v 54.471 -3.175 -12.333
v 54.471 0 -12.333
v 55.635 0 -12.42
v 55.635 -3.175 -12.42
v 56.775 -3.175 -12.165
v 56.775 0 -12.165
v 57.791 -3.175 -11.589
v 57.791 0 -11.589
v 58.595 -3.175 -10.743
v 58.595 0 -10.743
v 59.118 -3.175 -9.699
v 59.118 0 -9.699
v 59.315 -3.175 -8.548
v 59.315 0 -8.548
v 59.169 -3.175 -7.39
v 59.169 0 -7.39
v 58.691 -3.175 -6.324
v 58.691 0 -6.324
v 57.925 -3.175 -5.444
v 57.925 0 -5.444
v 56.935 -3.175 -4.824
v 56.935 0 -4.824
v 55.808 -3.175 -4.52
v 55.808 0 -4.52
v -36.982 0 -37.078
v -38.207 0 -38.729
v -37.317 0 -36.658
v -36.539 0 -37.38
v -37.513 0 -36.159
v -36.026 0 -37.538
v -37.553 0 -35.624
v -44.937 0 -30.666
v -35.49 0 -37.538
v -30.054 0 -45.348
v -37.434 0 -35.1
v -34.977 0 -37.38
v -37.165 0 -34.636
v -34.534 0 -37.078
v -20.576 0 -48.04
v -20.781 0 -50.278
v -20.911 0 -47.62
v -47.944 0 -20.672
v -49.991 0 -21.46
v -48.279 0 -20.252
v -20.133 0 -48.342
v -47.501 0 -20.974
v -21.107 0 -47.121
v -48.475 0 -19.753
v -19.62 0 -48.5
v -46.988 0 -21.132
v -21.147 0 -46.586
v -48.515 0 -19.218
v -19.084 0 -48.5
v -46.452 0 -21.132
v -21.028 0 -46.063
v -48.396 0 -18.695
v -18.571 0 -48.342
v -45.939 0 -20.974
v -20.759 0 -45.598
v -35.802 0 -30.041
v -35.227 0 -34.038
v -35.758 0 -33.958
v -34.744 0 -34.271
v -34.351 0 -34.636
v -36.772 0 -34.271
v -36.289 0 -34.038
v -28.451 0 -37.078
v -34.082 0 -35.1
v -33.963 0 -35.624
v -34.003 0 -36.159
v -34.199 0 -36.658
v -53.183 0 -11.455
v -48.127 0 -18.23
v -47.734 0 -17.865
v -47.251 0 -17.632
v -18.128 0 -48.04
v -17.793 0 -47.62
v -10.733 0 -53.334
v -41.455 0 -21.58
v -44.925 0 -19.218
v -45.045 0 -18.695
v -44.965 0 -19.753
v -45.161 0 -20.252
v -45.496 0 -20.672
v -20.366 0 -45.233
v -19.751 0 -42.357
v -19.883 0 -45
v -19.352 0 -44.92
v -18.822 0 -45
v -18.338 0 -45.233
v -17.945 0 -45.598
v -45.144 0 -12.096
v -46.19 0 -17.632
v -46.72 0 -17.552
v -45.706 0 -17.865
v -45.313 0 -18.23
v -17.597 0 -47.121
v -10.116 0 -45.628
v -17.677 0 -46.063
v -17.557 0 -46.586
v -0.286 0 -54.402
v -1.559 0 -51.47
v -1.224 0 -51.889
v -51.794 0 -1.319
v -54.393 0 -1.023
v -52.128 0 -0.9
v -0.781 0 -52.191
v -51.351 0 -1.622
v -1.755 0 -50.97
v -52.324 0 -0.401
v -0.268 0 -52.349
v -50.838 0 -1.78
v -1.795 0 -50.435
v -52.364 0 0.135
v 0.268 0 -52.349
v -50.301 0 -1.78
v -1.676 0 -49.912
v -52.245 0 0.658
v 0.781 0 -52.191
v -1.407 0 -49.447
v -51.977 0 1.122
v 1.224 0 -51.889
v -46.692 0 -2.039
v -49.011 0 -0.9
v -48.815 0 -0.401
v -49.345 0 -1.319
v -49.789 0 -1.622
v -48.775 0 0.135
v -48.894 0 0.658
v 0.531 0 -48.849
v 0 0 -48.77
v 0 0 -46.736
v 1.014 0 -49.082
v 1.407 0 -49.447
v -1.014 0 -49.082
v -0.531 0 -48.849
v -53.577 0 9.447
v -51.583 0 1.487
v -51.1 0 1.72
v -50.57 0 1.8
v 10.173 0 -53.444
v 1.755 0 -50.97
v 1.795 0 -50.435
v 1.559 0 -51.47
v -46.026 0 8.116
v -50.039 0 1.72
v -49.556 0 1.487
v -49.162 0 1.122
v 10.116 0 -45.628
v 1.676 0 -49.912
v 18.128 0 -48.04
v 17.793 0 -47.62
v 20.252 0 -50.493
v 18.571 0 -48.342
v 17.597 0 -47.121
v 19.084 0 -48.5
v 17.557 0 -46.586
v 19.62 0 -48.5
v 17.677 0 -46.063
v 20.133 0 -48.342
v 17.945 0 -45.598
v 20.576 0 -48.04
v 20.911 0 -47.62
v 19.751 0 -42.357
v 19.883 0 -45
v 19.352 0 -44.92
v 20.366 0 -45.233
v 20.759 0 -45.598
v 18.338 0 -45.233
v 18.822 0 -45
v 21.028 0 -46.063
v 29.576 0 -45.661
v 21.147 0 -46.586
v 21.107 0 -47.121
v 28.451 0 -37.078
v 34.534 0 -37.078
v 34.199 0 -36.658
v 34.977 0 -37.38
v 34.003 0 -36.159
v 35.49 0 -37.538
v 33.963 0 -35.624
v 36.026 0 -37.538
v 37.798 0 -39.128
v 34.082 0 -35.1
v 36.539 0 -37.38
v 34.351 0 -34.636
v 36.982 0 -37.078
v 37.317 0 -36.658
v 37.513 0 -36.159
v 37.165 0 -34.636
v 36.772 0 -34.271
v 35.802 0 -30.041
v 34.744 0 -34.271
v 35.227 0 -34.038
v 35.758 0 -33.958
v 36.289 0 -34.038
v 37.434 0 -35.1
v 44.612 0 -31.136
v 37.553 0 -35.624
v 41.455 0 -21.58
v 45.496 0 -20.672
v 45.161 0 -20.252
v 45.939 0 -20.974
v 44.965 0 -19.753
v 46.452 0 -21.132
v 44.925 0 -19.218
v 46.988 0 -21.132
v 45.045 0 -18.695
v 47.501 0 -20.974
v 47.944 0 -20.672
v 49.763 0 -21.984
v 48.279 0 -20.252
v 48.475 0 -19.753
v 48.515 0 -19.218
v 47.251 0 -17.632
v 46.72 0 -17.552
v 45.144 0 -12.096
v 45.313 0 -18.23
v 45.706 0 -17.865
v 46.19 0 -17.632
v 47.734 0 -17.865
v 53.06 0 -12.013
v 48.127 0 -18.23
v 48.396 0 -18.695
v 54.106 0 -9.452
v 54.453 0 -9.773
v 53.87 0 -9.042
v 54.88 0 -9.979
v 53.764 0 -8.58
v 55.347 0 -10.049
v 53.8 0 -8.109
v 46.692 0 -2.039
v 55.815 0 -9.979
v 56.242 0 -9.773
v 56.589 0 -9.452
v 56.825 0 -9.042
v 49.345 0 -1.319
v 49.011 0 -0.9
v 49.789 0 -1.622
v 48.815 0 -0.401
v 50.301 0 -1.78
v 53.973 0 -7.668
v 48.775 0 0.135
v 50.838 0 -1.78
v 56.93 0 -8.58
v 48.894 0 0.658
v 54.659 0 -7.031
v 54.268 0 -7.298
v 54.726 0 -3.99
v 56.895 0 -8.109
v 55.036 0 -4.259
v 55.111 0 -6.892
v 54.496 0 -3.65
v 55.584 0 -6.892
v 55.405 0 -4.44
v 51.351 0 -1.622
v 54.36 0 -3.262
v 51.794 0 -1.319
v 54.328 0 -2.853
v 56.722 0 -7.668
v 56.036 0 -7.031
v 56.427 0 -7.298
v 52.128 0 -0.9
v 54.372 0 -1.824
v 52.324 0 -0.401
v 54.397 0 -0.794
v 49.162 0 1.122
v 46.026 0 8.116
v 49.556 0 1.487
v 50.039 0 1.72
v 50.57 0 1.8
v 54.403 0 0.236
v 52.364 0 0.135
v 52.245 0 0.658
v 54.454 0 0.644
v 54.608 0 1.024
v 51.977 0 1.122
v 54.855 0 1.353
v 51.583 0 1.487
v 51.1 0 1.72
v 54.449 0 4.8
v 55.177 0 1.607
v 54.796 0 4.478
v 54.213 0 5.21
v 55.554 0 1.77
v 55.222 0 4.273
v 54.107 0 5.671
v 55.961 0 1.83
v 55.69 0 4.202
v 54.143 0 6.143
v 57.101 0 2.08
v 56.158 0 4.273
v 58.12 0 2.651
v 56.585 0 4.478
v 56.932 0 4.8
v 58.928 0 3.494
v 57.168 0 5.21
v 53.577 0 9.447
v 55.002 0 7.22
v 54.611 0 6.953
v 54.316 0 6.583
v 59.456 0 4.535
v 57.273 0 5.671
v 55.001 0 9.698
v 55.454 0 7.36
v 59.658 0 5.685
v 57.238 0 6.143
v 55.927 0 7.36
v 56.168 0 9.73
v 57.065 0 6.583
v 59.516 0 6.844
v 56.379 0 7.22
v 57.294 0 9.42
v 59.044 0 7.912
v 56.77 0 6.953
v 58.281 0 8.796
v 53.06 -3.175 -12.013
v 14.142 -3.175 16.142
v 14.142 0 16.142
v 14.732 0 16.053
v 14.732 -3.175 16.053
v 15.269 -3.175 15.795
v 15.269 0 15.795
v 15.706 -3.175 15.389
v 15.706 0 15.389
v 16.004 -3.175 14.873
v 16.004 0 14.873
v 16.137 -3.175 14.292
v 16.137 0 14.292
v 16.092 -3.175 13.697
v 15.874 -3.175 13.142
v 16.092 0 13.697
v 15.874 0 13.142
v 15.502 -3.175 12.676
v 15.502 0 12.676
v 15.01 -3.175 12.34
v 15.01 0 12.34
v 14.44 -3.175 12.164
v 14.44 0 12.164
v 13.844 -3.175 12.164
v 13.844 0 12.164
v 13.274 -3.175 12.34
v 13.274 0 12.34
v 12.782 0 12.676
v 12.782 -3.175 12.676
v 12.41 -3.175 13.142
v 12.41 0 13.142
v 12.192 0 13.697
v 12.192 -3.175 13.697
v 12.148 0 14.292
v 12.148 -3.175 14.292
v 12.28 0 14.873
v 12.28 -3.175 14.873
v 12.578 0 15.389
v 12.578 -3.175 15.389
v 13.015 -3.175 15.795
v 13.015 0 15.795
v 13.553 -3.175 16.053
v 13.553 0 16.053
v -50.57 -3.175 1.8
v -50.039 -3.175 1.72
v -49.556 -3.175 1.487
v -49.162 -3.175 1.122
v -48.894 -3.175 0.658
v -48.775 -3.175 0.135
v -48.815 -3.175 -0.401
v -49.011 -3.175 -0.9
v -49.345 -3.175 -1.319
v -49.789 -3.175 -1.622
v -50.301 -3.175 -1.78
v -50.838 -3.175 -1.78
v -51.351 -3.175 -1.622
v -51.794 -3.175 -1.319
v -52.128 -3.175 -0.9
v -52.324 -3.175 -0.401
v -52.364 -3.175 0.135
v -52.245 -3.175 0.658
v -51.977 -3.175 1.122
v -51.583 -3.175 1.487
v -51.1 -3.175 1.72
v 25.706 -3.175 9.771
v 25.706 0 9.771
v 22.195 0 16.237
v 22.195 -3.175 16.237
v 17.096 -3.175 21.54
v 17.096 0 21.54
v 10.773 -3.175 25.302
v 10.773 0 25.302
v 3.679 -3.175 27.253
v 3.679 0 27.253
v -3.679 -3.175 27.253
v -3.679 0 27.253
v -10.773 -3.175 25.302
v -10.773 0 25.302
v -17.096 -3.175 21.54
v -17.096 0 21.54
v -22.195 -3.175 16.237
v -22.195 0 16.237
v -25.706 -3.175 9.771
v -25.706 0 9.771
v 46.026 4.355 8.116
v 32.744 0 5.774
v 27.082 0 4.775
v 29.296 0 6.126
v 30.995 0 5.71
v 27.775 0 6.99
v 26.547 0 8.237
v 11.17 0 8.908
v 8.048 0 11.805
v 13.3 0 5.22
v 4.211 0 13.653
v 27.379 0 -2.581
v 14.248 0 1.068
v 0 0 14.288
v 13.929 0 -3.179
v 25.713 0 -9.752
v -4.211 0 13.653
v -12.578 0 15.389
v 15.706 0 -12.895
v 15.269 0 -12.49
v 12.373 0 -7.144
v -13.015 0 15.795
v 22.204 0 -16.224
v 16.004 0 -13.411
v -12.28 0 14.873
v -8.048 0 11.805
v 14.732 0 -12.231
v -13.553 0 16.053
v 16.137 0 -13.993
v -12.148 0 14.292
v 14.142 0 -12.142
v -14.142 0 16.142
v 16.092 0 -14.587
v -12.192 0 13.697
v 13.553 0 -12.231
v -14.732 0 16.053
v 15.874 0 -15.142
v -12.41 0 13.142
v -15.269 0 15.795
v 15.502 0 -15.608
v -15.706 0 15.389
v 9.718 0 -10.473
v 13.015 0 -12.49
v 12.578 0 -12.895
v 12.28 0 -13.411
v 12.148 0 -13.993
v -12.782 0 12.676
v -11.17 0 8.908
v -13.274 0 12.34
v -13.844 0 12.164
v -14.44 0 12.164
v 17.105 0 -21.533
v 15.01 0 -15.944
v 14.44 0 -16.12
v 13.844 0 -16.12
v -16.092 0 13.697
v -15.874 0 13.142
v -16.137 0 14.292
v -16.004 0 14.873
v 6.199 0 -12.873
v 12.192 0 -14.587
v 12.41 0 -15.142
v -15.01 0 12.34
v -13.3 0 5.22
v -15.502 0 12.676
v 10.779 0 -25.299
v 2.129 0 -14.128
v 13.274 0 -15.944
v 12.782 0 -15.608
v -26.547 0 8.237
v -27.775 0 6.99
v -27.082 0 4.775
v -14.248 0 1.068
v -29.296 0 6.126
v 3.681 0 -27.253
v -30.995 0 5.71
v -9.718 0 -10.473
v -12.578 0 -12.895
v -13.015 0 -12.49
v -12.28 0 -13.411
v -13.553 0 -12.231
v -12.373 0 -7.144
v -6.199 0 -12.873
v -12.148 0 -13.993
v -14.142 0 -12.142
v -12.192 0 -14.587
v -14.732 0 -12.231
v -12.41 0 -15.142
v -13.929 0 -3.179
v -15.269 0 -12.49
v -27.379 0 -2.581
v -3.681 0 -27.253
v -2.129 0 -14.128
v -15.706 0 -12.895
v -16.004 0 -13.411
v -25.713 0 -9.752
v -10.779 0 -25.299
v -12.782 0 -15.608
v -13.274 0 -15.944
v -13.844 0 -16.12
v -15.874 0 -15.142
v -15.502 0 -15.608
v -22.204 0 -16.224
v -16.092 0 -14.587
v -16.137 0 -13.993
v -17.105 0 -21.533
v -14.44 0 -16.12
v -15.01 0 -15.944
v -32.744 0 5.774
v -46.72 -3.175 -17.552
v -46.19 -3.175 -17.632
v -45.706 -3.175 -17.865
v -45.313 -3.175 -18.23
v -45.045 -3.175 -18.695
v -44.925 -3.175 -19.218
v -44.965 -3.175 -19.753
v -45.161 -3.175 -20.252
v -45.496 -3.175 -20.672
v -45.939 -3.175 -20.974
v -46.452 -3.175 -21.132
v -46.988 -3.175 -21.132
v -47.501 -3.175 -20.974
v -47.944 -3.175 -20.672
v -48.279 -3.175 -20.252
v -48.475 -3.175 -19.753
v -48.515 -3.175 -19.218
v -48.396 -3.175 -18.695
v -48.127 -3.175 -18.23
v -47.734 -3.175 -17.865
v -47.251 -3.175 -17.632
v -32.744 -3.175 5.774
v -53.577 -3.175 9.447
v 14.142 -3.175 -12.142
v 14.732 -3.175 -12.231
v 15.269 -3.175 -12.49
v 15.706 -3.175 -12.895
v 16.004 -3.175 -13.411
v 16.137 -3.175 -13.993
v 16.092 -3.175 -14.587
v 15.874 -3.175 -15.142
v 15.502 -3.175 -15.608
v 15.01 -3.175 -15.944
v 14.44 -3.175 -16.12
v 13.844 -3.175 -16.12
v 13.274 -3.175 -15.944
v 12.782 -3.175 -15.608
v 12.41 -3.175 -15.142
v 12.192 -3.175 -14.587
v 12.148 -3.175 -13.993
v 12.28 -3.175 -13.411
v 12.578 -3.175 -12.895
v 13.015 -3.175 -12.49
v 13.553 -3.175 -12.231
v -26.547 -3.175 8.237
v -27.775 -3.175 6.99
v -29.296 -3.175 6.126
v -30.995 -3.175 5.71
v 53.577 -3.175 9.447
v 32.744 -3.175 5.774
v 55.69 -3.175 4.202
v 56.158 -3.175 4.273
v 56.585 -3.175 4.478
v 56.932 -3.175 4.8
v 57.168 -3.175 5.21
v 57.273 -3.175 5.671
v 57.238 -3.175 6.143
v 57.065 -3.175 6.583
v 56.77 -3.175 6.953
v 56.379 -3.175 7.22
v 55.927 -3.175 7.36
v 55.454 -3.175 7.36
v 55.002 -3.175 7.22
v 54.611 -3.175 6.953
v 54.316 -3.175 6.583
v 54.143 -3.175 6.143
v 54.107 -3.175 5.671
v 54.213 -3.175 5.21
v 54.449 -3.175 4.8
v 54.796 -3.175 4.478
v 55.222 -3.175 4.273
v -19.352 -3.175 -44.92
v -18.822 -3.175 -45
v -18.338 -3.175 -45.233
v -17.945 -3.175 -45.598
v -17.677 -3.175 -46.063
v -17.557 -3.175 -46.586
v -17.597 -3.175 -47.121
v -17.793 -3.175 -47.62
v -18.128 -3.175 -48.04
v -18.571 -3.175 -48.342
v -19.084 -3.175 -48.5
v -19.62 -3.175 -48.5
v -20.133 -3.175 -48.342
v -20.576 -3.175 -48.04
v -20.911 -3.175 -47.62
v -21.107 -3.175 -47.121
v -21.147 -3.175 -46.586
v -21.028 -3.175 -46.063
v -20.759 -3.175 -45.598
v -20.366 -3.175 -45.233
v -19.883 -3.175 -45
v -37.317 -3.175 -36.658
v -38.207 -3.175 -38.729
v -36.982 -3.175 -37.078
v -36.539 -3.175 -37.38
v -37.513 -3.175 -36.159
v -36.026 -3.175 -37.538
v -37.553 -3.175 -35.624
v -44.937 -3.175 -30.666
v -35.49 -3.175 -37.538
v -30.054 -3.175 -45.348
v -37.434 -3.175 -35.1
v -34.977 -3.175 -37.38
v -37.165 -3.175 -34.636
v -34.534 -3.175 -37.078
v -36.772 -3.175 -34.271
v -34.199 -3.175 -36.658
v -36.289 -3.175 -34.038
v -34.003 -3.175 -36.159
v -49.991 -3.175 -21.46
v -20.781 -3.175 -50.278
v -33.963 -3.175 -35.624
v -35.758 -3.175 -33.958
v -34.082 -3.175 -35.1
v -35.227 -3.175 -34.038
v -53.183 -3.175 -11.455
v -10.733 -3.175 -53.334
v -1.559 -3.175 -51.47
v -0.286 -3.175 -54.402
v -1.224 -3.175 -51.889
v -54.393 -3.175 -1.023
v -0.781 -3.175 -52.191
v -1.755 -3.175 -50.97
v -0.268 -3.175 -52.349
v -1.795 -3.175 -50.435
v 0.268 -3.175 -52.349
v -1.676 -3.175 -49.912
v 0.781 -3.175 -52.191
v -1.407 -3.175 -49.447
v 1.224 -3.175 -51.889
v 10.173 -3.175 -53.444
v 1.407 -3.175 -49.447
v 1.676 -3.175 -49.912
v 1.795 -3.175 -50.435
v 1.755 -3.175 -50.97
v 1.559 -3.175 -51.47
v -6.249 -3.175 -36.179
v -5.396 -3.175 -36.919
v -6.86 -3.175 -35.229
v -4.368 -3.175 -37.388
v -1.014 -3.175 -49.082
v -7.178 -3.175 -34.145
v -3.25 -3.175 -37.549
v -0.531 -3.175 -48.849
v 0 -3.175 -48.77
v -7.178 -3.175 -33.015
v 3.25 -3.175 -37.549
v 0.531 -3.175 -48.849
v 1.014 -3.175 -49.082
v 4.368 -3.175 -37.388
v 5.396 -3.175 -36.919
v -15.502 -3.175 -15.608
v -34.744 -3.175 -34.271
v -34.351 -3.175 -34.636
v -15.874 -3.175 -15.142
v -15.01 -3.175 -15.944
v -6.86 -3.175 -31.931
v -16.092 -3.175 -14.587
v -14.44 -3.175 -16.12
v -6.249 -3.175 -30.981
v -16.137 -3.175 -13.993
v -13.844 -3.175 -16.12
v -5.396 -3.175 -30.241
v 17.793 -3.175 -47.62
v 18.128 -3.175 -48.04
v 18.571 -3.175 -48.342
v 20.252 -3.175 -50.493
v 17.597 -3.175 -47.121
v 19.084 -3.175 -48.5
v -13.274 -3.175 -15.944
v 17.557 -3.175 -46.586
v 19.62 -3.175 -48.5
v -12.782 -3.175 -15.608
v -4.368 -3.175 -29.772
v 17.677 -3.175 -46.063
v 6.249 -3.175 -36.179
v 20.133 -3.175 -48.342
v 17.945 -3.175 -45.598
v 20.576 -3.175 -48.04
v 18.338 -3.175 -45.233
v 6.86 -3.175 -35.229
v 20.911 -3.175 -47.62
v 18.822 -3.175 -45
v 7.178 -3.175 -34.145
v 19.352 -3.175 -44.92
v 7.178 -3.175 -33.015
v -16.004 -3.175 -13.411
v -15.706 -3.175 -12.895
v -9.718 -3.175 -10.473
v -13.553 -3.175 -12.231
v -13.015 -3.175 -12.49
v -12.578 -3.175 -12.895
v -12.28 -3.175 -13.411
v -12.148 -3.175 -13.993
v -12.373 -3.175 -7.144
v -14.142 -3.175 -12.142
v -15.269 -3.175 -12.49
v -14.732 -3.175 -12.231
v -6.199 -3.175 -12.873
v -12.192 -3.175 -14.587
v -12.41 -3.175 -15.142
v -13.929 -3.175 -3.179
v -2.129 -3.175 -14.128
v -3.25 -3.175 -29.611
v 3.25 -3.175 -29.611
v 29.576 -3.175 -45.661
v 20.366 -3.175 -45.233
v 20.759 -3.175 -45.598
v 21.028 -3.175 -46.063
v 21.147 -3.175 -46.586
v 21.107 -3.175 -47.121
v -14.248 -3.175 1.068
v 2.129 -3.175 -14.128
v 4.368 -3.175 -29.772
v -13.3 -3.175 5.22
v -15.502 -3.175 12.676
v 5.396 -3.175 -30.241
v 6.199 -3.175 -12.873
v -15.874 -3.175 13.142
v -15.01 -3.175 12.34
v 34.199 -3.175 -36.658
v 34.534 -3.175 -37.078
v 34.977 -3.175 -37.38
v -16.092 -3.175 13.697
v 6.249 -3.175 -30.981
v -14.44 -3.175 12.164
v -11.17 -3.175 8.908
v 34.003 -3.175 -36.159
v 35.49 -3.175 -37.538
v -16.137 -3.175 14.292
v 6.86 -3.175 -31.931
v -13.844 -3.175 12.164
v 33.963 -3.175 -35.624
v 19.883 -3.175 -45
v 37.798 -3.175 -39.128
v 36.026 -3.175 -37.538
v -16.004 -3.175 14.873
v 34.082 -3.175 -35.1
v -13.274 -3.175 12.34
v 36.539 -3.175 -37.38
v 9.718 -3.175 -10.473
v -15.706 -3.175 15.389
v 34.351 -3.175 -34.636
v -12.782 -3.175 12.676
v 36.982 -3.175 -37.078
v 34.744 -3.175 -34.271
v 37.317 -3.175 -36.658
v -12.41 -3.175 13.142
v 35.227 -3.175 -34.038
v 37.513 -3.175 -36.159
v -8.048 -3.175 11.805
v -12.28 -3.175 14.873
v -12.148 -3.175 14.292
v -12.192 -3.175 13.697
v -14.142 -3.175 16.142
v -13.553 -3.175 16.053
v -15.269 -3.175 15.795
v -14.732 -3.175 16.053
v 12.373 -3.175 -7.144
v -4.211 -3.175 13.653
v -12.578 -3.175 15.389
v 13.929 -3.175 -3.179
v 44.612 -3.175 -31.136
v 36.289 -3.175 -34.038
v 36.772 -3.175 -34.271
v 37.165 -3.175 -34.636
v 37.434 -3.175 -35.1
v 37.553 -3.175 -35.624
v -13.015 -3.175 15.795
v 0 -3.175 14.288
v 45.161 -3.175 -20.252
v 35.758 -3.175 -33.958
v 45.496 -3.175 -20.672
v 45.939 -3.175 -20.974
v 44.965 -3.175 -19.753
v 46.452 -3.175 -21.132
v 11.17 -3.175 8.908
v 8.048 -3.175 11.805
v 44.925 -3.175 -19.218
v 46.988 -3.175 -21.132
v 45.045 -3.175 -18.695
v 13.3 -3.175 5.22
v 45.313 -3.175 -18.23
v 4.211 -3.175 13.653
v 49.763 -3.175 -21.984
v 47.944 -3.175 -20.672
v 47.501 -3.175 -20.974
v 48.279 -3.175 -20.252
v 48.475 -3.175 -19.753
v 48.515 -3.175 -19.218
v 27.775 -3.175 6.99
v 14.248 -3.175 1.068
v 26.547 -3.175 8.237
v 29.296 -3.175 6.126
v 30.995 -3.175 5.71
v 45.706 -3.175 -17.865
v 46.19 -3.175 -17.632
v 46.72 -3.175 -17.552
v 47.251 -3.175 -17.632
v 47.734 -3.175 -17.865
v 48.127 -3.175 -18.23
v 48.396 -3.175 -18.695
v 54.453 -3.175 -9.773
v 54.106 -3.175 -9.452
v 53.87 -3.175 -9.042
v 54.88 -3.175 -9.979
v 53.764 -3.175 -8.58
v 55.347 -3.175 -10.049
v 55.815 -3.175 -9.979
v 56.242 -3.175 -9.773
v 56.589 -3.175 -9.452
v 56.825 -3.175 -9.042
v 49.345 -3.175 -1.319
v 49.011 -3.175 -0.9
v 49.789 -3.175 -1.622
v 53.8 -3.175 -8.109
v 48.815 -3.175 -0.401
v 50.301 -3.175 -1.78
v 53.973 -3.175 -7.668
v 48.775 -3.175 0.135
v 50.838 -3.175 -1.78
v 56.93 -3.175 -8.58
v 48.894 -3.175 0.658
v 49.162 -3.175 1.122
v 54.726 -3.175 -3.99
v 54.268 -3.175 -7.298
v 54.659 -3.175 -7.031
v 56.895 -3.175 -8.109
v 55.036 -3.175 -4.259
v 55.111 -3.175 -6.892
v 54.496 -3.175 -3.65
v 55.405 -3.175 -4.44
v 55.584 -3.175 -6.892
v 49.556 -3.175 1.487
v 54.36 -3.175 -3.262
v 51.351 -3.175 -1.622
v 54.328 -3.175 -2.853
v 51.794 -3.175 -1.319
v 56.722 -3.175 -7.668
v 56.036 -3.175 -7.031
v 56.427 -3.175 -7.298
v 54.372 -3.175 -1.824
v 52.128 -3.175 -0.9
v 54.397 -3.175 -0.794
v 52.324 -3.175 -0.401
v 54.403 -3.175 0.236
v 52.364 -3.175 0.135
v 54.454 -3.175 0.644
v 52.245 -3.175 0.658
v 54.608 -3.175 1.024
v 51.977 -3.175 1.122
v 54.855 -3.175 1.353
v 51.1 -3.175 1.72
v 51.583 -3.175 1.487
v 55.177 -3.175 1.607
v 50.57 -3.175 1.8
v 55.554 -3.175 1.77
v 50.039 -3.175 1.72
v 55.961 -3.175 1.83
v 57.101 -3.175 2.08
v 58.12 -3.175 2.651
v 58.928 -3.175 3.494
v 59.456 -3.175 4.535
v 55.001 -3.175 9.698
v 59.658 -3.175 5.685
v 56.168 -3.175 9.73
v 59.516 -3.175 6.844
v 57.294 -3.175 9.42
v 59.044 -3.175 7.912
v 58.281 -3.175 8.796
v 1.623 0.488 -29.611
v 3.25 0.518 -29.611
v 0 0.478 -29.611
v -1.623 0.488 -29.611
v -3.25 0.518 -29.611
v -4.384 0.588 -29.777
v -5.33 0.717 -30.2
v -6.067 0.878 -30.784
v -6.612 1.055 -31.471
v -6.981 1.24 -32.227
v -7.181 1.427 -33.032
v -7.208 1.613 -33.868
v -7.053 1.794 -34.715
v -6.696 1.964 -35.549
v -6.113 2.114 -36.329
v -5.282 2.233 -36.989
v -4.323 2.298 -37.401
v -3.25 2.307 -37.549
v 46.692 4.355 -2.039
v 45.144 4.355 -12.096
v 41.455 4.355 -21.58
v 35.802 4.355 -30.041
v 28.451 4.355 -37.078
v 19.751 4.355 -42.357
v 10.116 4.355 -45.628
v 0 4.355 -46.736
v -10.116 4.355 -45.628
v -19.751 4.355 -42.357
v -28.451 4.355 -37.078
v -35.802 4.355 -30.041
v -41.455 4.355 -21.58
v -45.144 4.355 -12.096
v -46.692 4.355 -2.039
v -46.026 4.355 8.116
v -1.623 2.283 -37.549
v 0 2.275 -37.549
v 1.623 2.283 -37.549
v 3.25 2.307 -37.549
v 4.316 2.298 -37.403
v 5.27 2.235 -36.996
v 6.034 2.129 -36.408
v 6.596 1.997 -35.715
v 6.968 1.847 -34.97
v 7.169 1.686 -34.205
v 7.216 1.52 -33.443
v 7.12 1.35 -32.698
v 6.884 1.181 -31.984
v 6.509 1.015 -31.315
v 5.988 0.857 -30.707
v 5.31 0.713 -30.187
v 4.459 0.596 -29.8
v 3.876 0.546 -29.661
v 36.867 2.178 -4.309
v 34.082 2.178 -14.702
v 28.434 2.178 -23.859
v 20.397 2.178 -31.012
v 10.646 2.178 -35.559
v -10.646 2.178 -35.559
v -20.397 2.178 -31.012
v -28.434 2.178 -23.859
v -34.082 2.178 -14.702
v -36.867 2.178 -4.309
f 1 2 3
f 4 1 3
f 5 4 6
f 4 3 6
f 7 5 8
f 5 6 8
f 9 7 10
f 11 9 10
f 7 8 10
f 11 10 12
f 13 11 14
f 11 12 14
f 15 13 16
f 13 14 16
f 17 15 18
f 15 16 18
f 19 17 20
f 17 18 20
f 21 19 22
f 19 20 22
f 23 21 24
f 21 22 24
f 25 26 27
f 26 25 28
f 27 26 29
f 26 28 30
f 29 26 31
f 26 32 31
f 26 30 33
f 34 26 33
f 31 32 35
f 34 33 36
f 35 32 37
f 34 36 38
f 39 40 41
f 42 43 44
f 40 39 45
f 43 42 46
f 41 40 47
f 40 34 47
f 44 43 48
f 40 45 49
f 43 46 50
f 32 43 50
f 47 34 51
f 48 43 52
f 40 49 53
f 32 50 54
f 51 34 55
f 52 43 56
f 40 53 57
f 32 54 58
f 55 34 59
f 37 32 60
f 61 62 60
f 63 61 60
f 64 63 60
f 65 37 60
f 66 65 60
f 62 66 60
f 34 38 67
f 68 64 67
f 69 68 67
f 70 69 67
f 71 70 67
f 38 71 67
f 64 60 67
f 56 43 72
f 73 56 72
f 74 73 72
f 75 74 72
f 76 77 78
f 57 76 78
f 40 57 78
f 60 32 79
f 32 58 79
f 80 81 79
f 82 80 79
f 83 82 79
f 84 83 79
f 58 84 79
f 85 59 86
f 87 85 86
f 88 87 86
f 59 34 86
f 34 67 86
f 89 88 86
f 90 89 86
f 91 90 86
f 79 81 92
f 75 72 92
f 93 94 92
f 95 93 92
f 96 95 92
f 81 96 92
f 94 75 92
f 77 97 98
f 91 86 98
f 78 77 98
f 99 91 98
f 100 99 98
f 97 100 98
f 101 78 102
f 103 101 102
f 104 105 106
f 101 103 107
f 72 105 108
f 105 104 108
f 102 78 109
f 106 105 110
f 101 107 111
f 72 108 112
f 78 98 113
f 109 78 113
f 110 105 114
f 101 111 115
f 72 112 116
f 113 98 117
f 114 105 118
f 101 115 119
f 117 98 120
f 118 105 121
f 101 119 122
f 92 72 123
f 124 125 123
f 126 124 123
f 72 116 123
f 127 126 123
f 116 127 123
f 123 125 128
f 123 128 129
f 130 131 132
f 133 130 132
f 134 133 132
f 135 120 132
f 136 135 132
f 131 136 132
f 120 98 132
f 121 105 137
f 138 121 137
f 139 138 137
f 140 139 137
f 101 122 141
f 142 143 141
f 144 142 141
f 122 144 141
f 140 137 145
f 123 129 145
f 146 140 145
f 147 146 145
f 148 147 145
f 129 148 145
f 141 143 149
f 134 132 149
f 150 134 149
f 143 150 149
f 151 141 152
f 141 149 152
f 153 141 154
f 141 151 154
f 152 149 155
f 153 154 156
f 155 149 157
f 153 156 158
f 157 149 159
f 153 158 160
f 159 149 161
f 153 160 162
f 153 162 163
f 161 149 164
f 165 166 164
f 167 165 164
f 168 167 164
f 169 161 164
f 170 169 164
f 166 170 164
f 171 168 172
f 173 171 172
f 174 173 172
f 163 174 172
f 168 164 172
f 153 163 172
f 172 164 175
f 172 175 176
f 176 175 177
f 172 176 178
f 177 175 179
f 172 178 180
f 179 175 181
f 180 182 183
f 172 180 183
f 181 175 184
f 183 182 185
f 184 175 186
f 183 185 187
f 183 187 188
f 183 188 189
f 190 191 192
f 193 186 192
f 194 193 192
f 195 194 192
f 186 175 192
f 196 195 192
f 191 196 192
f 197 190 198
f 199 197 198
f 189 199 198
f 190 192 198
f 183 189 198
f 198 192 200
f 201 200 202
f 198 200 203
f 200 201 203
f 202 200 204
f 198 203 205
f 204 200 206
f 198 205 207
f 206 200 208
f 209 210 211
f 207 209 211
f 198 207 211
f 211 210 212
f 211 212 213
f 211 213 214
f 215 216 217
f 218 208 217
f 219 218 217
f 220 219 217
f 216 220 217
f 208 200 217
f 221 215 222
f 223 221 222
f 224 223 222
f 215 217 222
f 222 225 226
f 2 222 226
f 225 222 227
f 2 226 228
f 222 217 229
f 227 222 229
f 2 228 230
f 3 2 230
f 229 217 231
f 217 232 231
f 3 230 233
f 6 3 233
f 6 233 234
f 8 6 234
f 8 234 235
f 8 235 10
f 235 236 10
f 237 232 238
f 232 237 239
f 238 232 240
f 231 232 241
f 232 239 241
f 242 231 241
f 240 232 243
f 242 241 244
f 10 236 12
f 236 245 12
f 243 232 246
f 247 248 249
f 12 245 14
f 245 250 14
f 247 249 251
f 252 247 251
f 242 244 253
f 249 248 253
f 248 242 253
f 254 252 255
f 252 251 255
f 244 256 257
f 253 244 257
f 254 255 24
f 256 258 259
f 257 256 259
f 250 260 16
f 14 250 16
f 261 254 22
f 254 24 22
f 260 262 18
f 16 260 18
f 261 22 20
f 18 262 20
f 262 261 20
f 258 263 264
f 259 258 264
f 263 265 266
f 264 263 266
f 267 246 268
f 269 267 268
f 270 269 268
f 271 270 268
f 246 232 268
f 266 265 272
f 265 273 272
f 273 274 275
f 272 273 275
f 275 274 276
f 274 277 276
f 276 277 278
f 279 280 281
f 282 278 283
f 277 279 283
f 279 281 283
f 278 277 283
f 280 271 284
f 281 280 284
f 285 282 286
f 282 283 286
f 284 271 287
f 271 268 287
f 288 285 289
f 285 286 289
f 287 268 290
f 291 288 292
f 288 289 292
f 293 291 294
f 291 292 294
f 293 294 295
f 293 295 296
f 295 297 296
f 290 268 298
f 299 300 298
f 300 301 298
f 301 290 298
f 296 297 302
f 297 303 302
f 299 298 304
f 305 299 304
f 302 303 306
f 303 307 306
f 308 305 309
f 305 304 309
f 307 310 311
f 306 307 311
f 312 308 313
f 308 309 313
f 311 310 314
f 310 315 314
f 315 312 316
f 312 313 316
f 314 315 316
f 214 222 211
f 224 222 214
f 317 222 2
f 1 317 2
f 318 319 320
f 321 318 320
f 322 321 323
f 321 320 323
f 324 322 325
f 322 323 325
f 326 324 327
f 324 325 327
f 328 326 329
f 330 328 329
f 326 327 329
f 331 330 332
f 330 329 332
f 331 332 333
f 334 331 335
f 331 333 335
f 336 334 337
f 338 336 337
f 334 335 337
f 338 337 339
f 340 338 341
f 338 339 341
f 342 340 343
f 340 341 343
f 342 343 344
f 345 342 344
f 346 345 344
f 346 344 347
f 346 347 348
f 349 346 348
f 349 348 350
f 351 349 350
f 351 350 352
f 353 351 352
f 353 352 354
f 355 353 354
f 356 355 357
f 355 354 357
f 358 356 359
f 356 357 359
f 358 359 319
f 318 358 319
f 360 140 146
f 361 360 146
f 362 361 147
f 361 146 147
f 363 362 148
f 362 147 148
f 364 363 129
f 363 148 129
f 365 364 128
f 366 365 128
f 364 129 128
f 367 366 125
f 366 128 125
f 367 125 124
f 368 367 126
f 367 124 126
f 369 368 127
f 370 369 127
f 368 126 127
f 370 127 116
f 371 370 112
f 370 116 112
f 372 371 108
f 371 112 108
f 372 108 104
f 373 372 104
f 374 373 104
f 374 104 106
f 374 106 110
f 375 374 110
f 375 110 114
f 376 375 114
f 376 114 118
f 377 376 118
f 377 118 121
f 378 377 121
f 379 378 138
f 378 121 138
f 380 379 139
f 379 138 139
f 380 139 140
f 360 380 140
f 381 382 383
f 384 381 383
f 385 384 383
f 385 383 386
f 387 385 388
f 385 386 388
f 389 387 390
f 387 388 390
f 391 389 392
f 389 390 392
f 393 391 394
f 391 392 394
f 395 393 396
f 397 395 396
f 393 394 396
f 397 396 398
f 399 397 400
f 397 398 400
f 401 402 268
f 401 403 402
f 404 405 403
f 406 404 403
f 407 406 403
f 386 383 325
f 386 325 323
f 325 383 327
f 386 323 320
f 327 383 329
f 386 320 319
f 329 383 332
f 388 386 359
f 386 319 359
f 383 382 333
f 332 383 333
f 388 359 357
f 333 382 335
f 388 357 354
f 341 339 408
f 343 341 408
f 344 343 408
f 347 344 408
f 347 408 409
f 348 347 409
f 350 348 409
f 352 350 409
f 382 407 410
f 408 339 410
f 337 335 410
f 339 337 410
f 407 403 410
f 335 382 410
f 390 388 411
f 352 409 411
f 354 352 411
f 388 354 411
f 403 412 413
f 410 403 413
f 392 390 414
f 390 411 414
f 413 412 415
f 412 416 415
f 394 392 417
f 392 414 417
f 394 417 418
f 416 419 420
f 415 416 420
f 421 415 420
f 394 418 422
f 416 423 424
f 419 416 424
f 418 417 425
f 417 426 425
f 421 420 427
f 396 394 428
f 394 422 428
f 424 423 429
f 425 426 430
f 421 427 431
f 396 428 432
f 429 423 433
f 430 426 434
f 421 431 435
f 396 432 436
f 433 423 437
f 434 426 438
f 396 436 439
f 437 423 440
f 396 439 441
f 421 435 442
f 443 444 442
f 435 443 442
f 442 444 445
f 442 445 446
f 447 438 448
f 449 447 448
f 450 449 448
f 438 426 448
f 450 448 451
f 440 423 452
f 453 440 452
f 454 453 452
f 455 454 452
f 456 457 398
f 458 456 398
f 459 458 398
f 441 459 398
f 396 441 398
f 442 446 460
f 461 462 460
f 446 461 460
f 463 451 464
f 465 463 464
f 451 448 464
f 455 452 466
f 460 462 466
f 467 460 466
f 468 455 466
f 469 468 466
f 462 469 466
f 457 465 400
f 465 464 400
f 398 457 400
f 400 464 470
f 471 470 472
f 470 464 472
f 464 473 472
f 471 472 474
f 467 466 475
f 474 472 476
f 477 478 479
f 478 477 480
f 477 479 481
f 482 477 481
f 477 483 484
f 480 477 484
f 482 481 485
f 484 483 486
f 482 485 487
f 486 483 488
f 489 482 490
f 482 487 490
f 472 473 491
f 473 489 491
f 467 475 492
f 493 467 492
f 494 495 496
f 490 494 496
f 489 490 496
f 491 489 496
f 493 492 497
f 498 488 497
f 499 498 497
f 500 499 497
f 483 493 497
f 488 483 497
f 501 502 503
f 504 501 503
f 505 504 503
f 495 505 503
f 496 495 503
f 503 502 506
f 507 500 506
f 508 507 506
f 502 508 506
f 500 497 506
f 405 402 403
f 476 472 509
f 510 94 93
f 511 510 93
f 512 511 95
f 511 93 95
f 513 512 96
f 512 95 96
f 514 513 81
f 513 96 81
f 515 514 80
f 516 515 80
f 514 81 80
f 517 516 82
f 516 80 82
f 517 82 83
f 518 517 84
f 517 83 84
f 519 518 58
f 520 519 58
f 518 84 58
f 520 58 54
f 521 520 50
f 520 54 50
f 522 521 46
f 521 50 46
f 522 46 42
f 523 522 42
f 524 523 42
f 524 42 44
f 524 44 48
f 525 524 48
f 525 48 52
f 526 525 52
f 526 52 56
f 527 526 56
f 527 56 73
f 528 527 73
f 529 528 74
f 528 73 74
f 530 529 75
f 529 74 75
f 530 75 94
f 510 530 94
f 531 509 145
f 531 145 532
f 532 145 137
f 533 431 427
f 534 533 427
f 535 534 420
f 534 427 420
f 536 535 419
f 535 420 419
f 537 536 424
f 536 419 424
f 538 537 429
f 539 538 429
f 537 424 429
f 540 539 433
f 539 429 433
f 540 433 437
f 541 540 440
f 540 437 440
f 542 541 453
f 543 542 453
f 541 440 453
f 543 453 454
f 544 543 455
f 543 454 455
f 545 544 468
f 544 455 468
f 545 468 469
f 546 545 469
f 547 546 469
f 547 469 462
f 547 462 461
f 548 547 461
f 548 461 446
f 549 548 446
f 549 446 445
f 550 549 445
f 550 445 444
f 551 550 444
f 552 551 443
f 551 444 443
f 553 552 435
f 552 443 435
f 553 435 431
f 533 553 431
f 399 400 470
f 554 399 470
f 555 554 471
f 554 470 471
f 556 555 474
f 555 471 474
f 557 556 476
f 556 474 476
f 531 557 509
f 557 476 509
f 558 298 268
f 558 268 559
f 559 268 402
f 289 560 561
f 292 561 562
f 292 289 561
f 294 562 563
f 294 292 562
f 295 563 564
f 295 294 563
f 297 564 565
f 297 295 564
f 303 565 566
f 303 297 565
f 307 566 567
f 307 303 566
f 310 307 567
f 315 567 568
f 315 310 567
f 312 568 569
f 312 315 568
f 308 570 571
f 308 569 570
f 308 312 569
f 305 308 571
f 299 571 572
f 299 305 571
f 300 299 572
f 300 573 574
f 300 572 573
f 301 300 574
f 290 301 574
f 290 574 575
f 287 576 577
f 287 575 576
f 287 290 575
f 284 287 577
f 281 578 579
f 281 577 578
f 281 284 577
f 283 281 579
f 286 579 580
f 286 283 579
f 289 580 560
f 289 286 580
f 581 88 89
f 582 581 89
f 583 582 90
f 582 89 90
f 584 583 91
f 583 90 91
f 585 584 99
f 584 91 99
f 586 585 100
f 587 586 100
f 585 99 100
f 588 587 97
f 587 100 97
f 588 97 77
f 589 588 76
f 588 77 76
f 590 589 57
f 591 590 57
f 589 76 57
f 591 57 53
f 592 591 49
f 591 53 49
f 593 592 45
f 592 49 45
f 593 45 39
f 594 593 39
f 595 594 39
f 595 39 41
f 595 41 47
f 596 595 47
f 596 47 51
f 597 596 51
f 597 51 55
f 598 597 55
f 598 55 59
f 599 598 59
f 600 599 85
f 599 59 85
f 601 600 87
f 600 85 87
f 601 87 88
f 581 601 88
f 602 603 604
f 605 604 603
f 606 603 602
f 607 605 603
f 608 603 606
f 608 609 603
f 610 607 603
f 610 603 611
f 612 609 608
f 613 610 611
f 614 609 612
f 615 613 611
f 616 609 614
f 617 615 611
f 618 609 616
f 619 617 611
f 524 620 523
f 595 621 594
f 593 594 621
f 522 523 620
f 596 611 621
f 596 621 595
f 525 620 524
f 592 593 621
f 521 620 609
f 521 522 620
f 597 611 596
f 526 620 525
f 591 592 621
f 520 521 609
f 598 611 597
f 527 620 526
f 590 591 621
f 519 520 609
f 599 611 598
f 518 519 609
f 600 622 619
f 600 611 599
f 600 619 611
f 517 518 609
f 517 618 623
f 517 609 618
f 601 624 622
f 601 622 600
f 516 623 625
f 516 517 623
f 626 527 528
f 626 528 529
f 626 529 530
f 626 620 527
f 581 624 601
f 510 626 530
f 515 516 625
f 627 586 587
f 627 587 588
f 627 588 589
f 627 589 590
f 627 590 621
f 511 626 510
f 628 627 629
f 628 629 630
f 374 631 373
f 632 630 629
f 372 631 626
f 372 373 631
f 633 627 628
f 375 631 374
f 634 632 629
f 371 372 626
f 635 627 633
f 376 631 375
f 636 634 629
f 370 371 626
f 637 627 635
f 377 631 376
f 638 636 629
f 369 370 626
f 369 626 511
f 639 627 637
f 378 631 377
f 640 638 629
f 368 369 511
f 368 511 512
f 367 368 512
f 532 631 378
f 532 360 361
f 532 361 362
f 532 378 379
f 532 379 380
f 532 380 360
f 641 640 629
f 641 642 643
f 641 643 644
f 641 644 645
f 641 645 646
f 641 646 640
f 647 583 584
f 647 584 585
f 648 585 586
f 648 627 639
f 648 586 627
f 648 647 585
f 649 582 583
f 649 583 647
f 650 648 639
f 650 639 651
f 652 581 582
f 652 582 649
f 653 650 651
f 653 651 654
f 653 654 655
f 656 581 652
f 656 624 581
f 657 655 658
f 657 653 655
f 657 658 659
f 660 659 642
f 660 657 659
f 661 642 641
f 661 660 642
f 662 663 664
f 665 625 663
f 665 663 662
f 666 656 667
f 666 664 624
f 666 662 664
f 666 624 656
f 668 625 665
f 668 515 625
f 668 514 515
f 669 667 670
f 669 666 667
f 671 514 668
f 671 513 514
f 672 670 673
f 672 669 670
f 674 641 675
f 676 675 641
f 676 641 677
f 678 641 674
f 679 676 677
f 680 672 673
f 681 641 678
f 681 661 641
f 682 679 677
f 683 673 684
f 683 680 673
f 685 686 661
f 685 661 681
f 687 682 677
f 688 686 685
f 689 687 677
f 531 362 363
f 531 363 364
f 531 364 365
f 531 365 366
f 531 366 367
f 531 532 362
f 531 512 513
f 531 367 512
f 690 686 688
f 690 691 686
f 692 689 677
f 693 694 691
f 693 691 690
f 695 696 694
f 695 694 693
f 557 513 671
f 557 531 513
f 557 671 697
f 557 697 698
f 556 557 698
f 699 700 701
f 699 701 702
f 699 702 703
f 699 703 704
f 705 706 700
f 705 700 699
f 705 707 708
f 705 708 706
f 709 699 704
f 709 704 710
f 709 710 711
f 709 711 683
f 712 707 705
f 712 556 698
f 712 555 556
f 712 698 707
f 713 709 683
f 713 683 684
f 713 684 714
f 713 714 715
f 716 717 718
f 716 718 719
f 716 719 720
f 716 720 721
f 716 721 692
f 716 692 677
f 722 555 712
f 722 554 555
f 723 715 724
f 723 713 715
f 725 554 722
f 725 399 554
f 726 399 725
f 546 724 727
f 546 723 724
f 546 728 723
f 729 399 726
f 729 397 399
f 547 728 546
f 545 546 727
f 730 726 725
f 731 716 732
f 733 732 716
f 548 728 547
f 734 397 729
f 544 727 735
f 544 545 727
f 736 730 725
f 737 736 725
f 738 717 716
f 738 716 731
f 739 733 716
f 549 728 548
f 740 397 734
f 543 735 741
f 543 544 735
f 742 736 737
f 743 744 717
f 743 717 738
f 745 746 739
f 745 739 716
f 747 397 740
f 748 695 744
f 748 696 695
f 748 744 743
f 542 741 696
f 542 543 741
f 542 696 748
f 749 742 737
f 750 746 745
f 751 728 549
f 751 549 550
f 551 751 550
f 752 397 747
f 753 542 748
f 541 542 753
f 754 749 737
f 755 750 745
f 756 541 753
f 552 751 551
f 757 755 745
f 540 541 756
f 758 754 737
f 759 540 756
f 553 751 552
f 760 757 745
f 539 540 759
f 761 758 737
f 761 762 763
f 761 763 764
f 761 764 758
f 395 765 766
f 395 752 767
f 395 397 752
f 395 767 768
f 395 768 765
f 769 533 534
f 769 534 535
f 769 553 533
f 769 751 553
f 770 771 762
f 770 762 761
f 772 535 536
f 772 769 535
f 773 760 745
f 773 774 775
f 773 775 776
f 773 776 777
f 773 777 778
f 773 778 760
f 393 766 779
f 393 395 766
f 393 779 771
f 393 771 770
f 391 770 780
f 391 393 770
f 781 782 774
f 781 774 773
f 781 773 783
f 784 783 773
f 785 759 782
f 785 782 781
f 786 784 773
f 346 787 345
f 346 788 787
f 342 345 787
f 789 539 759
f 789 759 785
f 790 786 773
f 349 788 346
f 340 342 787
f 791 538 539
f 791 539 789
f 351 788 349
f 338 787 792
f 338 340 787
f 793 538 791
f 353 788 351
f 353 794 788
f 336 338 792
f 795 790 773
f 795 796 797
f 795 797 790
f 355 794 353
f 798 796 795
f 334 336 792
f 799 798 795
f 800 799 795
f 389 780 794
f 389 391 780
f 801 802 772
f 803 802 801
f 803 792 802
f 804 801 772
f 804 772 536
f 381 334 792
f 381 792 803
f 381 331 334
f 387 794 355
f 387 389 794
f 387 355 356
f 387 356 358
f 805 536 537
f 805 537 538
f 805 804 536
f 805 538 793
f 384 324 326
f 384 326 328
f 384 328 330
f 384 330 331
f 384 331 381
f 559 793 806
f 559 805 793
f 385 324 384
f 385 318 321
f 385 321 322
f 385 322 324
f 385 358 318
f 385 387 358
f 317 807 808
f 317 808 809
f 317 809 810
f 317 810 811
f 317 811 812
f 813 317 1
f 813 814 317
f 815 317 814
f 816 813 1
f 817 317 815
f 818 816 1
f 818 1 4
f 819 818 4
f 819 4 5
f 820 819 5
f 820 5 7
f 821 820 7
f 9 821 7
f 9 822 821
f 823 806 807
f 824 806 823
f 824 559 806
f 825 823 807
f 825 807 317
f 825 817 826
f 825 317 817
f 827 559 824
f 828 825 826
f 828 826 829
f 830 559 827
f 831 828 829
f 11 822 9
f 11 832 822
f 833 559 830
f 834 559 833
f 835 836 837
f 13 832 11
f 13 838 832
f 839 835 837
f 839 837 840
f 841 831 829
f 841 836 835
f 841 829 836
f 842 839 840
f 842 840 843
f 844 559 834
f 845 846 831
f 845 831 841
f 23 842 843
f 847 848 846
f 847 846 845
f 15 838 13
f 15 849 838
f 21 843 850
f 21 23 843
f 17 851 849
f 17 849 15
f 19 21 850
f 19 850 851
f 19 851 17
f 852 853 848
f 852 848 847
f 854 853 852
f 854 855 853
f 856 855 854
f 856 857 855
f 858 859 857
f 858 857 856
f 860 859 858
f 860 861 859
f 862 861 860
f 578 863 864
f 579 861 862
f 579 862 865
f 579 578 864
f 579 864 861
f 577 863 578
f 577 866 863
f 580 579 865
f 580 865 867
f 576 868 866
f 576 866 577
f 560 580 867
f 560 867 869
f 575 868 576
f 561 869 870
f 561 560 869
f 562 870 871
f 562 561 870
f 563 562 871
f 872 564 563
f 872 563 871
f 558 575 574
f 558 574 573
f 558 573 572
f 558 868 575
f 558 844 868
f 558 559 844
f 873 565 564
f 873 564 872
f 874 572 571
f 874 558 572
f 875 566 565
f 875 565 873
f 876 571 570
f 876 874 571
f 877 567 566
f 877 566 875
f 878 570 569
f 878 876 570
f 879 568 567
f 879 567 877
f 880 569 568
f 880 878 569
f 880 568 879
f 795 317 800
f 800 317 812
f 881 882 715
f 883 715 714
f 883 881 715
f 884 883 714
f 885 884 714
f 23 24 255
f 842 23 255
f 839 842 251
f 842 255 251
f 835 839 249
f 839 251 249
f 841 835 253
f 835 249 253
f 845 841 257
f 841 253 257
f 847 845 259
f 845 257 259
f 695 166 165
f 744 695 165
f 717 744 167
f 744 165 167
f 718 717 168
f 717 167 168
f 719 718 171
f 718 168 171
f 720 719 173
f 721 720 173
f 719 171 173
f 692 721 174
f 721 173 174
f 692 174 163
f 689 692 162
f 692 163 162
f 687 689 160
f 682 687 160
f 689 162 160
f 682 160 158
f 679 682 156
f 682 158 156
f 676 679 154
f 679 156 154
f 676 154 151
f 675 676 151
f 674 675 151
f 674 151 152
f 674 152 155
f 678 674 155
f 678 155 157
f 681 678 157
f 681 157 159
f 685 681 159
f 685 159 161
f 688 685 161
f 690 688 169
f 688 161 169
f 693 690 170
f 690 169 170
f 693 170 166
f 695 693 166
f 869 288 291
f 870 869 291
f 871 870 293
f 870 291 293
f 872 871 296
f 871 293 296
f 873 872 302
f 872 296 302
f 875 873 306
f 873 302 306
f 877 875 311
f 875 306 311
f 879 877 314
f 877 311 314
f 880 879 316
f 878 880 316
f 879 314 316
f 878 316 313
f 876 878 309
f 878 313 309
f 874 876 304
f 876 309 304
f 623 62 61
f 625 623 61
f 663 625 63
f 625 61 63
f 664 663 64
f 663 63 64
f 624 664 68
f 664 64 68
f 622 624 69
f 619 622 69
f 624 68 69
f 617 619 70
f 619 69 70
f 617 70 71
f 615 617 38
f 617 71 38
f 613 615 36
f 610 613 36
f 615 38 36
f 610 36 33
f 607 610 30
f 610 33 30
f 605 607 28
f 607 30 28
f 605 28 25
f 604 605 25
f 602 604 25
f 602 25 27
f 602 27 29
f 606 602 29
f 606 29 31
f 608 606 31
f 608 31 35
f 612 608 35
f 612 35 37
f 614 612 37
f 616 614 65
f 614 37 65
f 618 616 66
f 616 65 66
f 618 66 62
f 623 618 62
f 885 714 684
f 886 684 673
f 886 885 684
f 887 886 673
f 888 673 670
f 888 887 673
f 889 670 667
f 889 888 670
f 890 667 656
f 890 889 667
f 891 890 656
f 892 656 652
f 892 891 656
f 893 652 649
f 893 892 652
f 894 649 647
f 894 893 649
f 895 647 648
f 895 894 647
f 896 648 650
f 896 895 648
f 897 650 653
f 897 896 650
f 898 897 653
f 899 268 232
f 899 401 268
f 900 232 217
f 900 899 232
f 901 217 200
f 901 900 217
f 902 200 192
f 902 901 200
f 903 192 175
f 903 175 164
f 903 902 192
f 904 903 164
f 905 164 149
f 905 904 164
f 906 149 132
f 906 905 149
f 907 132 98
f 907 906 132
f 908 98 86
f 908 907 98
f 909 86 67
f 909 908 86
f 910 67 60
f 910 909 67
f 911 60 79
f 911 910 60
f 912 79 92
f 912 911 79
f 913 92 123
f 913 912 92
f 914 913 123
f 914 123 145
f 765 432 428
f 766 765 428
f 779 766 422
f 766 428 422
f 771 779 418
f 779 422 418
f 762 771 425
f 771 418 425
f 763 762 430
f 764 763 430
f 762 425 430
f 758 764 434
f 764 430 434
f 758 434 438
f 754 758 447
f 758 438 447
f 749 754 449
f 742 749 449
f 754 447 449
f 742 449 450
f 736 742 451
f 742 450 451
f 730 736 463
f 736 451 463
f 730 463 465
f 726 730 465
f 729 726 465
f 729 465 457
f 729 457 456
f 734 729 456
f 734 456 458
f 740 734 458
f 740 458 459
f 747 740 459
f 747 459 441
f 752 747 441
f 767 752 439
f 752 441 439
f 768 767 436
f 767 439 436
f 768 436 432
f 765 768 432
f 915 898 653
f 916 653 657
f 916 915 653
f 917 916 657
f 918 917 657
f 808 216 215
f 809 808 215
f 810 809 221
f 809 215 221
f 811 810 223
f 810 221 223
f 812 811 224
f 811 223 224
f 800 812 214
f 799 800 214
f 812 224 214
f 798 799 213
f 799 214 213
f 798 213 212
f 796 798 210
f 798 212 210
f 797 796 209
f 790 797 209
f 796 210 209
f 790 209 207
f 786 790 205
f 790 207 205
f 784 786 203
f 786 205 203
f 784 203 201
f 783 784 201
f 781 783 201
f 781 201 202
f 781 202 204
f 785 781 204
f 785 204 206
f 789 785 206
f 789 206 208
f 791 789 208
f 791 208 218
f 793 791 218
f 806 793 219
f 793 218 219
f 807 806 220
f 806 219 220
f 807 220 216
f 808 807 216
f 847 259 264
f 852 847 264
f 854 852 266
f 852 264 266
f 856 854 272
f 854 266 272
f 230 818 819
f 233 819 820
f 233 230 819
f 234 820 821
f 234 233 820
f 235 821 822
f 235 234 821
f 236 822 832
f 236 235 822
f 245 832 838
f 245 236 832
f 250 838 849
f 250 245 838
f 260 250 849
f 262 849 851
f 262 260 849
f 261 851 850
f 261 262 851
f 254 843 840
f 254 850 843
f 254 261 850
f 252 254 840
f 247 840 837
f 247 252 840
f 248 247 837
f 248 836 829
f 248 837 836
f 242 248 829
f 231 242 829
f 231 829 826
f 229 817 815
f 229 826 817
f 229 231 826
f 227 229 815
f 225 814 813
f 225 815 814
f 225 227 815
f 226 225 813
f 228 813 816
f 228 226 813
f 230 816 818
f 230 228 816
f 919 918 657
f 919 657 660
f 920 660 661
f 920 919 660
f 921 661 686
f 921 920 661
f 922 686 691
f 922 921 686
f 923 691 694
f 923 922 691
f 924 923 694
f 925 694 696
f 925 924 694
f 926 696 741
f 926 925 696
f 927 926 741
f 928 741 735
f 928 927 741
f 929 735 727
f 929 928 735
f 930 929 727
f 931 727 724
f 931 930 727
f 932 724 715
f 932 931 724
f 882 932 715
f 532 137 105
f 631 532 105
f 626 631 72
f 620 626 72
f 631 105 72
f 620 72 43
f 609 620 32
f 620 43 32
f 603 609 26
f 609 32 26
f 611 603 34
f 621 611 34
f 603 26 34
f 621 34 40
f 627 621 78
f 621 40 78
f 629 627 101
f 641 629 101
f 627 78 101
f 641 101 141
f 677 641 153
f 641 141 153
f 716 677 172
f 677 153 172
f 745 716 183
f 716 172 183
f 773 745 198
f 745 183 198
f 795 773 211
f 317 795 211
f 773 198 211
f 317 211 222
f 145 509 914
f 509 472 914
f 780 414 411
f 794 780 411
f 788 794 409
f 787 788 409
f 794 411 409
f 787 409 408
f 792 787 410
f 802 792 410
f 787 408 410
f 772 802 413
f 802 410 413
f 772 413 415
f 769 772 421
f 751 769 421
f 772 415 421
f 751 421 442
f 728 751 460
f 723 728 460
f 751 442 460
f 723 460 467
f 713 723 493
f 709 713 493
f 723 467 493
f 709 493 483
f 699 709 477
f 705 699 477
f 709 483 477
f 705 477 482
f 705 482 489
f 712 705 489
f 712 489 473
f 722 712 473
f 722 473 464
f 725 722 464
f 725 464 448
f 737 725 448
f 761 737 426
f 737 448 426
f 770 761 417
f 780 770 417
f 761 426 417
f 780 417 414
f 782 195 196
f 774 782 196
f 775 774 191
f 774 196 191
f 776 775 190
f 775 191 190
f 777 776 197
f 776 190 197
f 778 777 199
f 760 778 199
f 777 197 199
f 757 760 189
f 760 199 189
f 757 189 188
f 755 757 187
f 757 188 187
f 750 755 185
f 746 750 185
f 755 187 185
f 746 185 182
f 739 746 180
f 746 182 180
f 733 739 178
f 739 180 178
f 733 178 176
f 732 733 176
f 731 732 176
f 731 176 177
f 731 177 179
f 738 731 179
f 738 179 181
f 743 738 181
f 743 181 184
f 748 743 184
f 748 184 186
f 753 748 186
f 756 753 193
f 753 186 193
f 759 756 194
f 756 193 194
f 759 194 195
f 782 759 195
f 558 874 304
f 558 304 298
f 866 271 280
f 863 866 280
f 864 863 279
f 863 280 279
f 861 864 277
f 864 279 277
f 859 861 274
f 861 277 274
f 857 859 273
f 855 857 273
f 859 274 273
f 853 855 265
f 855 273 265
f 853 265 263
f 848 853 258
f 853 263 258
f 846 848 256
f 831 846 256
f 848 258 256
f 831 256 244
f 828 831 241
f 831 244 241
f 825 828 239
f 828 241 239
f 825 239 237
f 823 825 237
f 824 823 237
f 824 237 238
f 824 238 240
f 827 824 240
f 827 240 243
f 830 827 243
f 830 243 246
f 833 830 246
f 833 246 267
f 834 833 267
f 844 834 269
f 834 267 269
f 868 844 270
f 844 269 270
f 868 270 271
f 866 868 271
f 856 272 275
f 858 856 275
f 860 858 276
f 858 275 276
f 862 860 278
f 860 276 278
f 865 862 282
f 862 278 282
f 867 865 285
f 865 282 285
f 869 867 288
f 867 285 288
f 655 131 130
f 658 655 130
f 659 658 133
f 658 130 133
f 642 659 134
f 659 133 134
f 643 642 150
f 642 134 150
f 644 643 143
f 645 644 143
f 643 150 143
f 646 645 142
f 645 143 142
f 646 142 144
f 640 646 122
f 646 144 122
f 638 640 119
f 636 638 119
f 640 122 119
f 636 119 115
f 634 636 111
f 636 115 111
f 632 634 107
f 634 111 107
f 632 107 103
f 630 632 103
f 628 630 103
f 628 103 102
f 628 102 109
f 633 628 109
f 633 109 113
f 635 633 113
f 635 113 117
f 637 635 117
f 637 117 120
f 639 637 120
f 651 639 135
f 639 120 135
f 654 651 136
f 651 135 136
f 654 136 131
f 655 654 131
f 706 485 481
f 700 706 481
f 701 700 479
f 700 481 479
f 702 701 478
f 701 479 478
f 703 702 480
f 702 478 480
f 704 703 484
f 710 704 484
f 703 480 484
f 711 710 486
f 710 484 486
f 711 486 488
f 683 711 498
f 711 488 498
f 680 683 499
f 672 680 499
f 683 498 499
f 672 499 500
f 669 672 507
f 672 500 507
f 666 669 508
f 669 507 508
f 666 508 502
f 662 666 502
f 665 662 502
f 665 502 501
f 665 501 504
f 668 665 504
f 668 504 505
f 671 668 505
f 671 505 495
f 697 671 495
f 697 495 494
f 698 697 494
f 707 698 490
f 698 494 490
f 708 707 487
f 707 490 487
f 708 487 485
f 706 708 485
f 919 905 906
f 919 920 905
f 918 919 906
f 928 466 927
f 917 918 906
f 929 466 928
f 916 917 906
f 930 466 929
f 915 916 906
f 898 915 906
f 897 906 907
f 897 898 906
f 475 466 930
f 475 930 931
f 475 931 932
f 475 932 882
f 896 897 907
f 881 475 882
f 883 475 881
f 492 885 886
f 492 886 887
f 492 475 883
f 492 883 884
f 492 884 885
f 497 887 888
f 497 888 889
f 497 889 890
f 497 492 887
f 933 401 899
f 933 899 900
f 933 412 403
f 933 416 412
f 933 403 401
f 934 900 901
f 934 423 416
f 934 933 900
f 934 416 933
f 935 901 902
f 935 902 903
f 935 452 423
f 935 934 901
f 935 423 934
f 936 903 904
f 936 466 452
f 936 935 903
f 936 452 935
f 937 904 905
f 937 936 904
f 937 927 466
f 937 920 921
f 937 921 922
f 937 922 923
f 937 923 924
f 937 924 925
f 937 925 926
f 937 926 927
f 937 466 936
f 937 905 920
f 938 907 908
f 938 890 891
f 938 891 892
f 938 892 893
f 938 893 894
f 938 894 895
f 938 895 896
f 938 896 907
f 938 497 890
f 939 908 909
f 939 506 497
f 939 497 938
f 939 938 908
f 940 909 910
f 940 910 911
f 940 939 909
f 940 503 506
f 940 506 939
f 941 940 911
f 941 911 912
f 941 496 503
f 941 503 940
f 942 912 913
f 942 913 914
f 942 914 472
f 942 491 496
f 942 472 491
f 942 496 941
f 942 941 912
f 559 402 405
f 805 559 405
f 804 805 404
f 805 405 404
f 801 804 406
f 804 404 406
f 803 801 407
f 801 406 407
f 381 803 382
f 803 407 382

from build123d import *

# Parameters (mm, degrees)
SKETCH1_R           = 1.8
SKETCH1_R_2         = 2
SKETCH1_R_3         = 14.2875
BOSS_EXTRUDE1_DEPTH = 3.175
REVOLVE3_ANGLE      = 200
BOSS_EXTRUDE2_START = -3.175
SKETCH3_R           = 1.5875
BOSS_EXTRUDE2_DEPTH = 3.175
CUT_EXTRUDE1_DEPTH  = 81.857095427


# Read off the part's stored shape, not the designer's step: Revolve3
with BuildPart() as part:
    # Sketch1 → Boss-Extrude1 (new body)
    with BuildSketch(Plane(origin=(0, 0, 0), x_dir=(1, 0, 0), z_dir=(0, 1, 0))):
        with BuildLine():
            Line((53.576531883, -9.446988104), (32.743932203, -5.773638702))
            ThreePointArc((32.743932203, -5.773638702), (28.505328465, -6.505538278), (25.705607757, -9.770963609))
            ThreePointArc((25.705607757, -9.770963609), (0, -27.5), (-25.705607757, -9.770963609))
            ThreePointArc((-25.705607757, -9.770963609), (-28.505328465, -6.505538278), (-32.743932203, -5.773638702))
            Line((-32.743932203, -5.773638702), (-53.576531883, -9.446988104))
            ThreePointArc((-53.576531883, -9.446988104), (0, 54.403036246), (53.576531883, -9.446988104))
        make_face()
        with Locations(Location((-50.569518123, 0, 0), (0, 0, 270))):
            Circle(SKETCH1_R, mode=Mode.SUBTRACT)
        with Locations(Location((-46.720142763, 19.352116768, 0), (0, 0, 270))):
            Circle(SKETCH1_R, mode=Mode.SUBTRACT)
        with Locations(Location((-35.758049186, 35.758049186, 0), (0, 0, 270))):
            Circle(SKETCH1_R, mode=Mode.SUBTRACT)
        with Locations(Location((-19.352116768, 46.720142763, 0), (0, 0, 270))):
            Circle(SKETCH1_R, mode=Mode.SUBTRACT)
        with Locations(Location((0, 50.569518123, 0), (0, 0, 270))):
            Circle(SKETCH1_R, mode=Mode.SUBTRACT)
        with Locations(Location((19.352116768, 46.720142763, 0), (0, 0, 270))):
            Circle(SKETCH1_R, mode=Mode.SUBTRACT)
        with Locations(Location((35.758049186, 35.758049186, 0), (0, 0, 270))):
            Circle(SKETCH1_R, mode=Mode.SUBTRACT)
        with Locations(Location((46.720142763, 19.352116768, 0), (0, 0, 270))):
            Circle(SKETCH1_R, mode=Mode.SUBTRACT)
        with Locations(Location((50.569518123, 0, 0), (0, 0, 270))):
            Circle(SKETCH1_R, mode=Mode.SUBTRACT)
        with Locations(Location((14.142135624, 14.142135624, 0), (0, 0, 270))):
            Circle(SKETCH1_R_2, mode=Mode.SUBTRACT)
        with Locations(Location((-14.142135624, 14.142135624, 0), (0, 0, 270))):
            Circle(SKETCH1_R_2, mode=Mode.SUBTRACT)
        with Locations(Location((-14.142135624, -14.142135624, 0), (0, 0, 270))):
            Circle(SKETCH1_R_2, mode=Mode.SUBTRACT)
        with Locations(Location((14.142135624, -14.142135624, 0), (0, 0, 270))):
            Circle(SKETCH1_R_2, mode=Mode.SUBTRACT)
        with Locations(Location((0, 0, 0), (0, 0, 270))):
            Circle(SKETCH1_R_3, mode=Mode.SUBTRACT)
        with BuildLine():
            Line((-3.25, 37.54875), (3.25, 37.54875))
            ThreePointArc((3.25, 37.54875), (7.21875, 33.58), (3.25, 29.61125))
            Line((3.25, 29.61125), (-3.25, 29.61125))
            ThreePointArc((-3.25, 29.61125), (-7.21875, 33.58), (-3.25, 37.54875))
        make_face(mode=Mode.SUBTRACT)
    extrude(amount=-BOSS_EXTRUDE1_DEPTH)

    # Revolve3 outline → Revolve3 (revolve)
    with BuildSketch(Plane(origin=(0, 0, 0), x_dir=(0.9848077530122042, 0, 0.1736481776669518), z_dir=(-0.1736481776669518, 0, 0.9848077530122042))):
        Polygon((46.736, 0), (46.736, 4.35512275), (27.5, 0), align=None)
    revolve(axis=Axis((0, 0, 0), (0, 1, 0)), revolution_arc=REVOLVE3_ANGLE)

    # Sketch3 → Boss-Extrude2 (add)
    with BuildSketch(Plane.XZ.offset(3.175).offset(BOSS_EXTRUDE2_START)):
        with BuildLine():
            Line((53.060117126, -12.013089669), (54.471072105, -12.3325373))
            ThreePointArc((54.471072105, -12.3325373), (59.259341774, -9.131069871), (55.807809409, -4.519796246))
            ThreePointArc((55.807809409, -4.519796246), (54.72616849, -3.989558211), (54.328198384, -2.85258009))
            ThreePointArc((54.328198384, -2.85258009), (54.387291369, -1.308774374), (54.402523984, 0.236086798))
            ThreePointArc((54.402523984, 0.236086798), (54.854722203, 1.352606489), (55.960615645, 1.830203754))
            ThreePointArc((55.960615645, 1.830203754), (59.629955631, 6.270120891), (55.001219172, 9.698198912))
            Line((55.001219172, 9.698198912), (53.576531883, 9.446988104))
            Line((53.576531883, 9.446988104), (53.060117126, -12.013089669))
        make_face()
        with Locations(Location((55.690385377, 5.789743142, 0), (0, 0, 270))):
            Circle(SKETCH3_R, mode=Mode.SUBTRACT)
        with Locations(Location((55.347437708, -8.461754447, 0), (0, 0, 270))):
            Circle(SKETCH3_R, mode=Mode.SUBTRACT)
    extrude(amount=BOSS_EXTRUDE2_DEPTH)

    # Sketch4 → Cut-Extrude1 (cut, through all)
    with BuildSketch(Plane.XZ):
        with BuildLine():
            Line((-3.25, -37.54875), (3.25, -37.54875))
            ThreePointArc((3.25, -37.54875), (7.21875, -33.58), (3.25, -29.61125))
            Line((3.25, -29.61125), (-3.25, -29.61125))
            ThreePointArc((-3.25, -29.61125), (-7.21875, -33.58), (-3.25, -37.54875))
        make_face()
    extrude(amount=-CUT_EXTRUDE1_DEPTH, mode=Mode.SUBTRACT)


solid = part.part
